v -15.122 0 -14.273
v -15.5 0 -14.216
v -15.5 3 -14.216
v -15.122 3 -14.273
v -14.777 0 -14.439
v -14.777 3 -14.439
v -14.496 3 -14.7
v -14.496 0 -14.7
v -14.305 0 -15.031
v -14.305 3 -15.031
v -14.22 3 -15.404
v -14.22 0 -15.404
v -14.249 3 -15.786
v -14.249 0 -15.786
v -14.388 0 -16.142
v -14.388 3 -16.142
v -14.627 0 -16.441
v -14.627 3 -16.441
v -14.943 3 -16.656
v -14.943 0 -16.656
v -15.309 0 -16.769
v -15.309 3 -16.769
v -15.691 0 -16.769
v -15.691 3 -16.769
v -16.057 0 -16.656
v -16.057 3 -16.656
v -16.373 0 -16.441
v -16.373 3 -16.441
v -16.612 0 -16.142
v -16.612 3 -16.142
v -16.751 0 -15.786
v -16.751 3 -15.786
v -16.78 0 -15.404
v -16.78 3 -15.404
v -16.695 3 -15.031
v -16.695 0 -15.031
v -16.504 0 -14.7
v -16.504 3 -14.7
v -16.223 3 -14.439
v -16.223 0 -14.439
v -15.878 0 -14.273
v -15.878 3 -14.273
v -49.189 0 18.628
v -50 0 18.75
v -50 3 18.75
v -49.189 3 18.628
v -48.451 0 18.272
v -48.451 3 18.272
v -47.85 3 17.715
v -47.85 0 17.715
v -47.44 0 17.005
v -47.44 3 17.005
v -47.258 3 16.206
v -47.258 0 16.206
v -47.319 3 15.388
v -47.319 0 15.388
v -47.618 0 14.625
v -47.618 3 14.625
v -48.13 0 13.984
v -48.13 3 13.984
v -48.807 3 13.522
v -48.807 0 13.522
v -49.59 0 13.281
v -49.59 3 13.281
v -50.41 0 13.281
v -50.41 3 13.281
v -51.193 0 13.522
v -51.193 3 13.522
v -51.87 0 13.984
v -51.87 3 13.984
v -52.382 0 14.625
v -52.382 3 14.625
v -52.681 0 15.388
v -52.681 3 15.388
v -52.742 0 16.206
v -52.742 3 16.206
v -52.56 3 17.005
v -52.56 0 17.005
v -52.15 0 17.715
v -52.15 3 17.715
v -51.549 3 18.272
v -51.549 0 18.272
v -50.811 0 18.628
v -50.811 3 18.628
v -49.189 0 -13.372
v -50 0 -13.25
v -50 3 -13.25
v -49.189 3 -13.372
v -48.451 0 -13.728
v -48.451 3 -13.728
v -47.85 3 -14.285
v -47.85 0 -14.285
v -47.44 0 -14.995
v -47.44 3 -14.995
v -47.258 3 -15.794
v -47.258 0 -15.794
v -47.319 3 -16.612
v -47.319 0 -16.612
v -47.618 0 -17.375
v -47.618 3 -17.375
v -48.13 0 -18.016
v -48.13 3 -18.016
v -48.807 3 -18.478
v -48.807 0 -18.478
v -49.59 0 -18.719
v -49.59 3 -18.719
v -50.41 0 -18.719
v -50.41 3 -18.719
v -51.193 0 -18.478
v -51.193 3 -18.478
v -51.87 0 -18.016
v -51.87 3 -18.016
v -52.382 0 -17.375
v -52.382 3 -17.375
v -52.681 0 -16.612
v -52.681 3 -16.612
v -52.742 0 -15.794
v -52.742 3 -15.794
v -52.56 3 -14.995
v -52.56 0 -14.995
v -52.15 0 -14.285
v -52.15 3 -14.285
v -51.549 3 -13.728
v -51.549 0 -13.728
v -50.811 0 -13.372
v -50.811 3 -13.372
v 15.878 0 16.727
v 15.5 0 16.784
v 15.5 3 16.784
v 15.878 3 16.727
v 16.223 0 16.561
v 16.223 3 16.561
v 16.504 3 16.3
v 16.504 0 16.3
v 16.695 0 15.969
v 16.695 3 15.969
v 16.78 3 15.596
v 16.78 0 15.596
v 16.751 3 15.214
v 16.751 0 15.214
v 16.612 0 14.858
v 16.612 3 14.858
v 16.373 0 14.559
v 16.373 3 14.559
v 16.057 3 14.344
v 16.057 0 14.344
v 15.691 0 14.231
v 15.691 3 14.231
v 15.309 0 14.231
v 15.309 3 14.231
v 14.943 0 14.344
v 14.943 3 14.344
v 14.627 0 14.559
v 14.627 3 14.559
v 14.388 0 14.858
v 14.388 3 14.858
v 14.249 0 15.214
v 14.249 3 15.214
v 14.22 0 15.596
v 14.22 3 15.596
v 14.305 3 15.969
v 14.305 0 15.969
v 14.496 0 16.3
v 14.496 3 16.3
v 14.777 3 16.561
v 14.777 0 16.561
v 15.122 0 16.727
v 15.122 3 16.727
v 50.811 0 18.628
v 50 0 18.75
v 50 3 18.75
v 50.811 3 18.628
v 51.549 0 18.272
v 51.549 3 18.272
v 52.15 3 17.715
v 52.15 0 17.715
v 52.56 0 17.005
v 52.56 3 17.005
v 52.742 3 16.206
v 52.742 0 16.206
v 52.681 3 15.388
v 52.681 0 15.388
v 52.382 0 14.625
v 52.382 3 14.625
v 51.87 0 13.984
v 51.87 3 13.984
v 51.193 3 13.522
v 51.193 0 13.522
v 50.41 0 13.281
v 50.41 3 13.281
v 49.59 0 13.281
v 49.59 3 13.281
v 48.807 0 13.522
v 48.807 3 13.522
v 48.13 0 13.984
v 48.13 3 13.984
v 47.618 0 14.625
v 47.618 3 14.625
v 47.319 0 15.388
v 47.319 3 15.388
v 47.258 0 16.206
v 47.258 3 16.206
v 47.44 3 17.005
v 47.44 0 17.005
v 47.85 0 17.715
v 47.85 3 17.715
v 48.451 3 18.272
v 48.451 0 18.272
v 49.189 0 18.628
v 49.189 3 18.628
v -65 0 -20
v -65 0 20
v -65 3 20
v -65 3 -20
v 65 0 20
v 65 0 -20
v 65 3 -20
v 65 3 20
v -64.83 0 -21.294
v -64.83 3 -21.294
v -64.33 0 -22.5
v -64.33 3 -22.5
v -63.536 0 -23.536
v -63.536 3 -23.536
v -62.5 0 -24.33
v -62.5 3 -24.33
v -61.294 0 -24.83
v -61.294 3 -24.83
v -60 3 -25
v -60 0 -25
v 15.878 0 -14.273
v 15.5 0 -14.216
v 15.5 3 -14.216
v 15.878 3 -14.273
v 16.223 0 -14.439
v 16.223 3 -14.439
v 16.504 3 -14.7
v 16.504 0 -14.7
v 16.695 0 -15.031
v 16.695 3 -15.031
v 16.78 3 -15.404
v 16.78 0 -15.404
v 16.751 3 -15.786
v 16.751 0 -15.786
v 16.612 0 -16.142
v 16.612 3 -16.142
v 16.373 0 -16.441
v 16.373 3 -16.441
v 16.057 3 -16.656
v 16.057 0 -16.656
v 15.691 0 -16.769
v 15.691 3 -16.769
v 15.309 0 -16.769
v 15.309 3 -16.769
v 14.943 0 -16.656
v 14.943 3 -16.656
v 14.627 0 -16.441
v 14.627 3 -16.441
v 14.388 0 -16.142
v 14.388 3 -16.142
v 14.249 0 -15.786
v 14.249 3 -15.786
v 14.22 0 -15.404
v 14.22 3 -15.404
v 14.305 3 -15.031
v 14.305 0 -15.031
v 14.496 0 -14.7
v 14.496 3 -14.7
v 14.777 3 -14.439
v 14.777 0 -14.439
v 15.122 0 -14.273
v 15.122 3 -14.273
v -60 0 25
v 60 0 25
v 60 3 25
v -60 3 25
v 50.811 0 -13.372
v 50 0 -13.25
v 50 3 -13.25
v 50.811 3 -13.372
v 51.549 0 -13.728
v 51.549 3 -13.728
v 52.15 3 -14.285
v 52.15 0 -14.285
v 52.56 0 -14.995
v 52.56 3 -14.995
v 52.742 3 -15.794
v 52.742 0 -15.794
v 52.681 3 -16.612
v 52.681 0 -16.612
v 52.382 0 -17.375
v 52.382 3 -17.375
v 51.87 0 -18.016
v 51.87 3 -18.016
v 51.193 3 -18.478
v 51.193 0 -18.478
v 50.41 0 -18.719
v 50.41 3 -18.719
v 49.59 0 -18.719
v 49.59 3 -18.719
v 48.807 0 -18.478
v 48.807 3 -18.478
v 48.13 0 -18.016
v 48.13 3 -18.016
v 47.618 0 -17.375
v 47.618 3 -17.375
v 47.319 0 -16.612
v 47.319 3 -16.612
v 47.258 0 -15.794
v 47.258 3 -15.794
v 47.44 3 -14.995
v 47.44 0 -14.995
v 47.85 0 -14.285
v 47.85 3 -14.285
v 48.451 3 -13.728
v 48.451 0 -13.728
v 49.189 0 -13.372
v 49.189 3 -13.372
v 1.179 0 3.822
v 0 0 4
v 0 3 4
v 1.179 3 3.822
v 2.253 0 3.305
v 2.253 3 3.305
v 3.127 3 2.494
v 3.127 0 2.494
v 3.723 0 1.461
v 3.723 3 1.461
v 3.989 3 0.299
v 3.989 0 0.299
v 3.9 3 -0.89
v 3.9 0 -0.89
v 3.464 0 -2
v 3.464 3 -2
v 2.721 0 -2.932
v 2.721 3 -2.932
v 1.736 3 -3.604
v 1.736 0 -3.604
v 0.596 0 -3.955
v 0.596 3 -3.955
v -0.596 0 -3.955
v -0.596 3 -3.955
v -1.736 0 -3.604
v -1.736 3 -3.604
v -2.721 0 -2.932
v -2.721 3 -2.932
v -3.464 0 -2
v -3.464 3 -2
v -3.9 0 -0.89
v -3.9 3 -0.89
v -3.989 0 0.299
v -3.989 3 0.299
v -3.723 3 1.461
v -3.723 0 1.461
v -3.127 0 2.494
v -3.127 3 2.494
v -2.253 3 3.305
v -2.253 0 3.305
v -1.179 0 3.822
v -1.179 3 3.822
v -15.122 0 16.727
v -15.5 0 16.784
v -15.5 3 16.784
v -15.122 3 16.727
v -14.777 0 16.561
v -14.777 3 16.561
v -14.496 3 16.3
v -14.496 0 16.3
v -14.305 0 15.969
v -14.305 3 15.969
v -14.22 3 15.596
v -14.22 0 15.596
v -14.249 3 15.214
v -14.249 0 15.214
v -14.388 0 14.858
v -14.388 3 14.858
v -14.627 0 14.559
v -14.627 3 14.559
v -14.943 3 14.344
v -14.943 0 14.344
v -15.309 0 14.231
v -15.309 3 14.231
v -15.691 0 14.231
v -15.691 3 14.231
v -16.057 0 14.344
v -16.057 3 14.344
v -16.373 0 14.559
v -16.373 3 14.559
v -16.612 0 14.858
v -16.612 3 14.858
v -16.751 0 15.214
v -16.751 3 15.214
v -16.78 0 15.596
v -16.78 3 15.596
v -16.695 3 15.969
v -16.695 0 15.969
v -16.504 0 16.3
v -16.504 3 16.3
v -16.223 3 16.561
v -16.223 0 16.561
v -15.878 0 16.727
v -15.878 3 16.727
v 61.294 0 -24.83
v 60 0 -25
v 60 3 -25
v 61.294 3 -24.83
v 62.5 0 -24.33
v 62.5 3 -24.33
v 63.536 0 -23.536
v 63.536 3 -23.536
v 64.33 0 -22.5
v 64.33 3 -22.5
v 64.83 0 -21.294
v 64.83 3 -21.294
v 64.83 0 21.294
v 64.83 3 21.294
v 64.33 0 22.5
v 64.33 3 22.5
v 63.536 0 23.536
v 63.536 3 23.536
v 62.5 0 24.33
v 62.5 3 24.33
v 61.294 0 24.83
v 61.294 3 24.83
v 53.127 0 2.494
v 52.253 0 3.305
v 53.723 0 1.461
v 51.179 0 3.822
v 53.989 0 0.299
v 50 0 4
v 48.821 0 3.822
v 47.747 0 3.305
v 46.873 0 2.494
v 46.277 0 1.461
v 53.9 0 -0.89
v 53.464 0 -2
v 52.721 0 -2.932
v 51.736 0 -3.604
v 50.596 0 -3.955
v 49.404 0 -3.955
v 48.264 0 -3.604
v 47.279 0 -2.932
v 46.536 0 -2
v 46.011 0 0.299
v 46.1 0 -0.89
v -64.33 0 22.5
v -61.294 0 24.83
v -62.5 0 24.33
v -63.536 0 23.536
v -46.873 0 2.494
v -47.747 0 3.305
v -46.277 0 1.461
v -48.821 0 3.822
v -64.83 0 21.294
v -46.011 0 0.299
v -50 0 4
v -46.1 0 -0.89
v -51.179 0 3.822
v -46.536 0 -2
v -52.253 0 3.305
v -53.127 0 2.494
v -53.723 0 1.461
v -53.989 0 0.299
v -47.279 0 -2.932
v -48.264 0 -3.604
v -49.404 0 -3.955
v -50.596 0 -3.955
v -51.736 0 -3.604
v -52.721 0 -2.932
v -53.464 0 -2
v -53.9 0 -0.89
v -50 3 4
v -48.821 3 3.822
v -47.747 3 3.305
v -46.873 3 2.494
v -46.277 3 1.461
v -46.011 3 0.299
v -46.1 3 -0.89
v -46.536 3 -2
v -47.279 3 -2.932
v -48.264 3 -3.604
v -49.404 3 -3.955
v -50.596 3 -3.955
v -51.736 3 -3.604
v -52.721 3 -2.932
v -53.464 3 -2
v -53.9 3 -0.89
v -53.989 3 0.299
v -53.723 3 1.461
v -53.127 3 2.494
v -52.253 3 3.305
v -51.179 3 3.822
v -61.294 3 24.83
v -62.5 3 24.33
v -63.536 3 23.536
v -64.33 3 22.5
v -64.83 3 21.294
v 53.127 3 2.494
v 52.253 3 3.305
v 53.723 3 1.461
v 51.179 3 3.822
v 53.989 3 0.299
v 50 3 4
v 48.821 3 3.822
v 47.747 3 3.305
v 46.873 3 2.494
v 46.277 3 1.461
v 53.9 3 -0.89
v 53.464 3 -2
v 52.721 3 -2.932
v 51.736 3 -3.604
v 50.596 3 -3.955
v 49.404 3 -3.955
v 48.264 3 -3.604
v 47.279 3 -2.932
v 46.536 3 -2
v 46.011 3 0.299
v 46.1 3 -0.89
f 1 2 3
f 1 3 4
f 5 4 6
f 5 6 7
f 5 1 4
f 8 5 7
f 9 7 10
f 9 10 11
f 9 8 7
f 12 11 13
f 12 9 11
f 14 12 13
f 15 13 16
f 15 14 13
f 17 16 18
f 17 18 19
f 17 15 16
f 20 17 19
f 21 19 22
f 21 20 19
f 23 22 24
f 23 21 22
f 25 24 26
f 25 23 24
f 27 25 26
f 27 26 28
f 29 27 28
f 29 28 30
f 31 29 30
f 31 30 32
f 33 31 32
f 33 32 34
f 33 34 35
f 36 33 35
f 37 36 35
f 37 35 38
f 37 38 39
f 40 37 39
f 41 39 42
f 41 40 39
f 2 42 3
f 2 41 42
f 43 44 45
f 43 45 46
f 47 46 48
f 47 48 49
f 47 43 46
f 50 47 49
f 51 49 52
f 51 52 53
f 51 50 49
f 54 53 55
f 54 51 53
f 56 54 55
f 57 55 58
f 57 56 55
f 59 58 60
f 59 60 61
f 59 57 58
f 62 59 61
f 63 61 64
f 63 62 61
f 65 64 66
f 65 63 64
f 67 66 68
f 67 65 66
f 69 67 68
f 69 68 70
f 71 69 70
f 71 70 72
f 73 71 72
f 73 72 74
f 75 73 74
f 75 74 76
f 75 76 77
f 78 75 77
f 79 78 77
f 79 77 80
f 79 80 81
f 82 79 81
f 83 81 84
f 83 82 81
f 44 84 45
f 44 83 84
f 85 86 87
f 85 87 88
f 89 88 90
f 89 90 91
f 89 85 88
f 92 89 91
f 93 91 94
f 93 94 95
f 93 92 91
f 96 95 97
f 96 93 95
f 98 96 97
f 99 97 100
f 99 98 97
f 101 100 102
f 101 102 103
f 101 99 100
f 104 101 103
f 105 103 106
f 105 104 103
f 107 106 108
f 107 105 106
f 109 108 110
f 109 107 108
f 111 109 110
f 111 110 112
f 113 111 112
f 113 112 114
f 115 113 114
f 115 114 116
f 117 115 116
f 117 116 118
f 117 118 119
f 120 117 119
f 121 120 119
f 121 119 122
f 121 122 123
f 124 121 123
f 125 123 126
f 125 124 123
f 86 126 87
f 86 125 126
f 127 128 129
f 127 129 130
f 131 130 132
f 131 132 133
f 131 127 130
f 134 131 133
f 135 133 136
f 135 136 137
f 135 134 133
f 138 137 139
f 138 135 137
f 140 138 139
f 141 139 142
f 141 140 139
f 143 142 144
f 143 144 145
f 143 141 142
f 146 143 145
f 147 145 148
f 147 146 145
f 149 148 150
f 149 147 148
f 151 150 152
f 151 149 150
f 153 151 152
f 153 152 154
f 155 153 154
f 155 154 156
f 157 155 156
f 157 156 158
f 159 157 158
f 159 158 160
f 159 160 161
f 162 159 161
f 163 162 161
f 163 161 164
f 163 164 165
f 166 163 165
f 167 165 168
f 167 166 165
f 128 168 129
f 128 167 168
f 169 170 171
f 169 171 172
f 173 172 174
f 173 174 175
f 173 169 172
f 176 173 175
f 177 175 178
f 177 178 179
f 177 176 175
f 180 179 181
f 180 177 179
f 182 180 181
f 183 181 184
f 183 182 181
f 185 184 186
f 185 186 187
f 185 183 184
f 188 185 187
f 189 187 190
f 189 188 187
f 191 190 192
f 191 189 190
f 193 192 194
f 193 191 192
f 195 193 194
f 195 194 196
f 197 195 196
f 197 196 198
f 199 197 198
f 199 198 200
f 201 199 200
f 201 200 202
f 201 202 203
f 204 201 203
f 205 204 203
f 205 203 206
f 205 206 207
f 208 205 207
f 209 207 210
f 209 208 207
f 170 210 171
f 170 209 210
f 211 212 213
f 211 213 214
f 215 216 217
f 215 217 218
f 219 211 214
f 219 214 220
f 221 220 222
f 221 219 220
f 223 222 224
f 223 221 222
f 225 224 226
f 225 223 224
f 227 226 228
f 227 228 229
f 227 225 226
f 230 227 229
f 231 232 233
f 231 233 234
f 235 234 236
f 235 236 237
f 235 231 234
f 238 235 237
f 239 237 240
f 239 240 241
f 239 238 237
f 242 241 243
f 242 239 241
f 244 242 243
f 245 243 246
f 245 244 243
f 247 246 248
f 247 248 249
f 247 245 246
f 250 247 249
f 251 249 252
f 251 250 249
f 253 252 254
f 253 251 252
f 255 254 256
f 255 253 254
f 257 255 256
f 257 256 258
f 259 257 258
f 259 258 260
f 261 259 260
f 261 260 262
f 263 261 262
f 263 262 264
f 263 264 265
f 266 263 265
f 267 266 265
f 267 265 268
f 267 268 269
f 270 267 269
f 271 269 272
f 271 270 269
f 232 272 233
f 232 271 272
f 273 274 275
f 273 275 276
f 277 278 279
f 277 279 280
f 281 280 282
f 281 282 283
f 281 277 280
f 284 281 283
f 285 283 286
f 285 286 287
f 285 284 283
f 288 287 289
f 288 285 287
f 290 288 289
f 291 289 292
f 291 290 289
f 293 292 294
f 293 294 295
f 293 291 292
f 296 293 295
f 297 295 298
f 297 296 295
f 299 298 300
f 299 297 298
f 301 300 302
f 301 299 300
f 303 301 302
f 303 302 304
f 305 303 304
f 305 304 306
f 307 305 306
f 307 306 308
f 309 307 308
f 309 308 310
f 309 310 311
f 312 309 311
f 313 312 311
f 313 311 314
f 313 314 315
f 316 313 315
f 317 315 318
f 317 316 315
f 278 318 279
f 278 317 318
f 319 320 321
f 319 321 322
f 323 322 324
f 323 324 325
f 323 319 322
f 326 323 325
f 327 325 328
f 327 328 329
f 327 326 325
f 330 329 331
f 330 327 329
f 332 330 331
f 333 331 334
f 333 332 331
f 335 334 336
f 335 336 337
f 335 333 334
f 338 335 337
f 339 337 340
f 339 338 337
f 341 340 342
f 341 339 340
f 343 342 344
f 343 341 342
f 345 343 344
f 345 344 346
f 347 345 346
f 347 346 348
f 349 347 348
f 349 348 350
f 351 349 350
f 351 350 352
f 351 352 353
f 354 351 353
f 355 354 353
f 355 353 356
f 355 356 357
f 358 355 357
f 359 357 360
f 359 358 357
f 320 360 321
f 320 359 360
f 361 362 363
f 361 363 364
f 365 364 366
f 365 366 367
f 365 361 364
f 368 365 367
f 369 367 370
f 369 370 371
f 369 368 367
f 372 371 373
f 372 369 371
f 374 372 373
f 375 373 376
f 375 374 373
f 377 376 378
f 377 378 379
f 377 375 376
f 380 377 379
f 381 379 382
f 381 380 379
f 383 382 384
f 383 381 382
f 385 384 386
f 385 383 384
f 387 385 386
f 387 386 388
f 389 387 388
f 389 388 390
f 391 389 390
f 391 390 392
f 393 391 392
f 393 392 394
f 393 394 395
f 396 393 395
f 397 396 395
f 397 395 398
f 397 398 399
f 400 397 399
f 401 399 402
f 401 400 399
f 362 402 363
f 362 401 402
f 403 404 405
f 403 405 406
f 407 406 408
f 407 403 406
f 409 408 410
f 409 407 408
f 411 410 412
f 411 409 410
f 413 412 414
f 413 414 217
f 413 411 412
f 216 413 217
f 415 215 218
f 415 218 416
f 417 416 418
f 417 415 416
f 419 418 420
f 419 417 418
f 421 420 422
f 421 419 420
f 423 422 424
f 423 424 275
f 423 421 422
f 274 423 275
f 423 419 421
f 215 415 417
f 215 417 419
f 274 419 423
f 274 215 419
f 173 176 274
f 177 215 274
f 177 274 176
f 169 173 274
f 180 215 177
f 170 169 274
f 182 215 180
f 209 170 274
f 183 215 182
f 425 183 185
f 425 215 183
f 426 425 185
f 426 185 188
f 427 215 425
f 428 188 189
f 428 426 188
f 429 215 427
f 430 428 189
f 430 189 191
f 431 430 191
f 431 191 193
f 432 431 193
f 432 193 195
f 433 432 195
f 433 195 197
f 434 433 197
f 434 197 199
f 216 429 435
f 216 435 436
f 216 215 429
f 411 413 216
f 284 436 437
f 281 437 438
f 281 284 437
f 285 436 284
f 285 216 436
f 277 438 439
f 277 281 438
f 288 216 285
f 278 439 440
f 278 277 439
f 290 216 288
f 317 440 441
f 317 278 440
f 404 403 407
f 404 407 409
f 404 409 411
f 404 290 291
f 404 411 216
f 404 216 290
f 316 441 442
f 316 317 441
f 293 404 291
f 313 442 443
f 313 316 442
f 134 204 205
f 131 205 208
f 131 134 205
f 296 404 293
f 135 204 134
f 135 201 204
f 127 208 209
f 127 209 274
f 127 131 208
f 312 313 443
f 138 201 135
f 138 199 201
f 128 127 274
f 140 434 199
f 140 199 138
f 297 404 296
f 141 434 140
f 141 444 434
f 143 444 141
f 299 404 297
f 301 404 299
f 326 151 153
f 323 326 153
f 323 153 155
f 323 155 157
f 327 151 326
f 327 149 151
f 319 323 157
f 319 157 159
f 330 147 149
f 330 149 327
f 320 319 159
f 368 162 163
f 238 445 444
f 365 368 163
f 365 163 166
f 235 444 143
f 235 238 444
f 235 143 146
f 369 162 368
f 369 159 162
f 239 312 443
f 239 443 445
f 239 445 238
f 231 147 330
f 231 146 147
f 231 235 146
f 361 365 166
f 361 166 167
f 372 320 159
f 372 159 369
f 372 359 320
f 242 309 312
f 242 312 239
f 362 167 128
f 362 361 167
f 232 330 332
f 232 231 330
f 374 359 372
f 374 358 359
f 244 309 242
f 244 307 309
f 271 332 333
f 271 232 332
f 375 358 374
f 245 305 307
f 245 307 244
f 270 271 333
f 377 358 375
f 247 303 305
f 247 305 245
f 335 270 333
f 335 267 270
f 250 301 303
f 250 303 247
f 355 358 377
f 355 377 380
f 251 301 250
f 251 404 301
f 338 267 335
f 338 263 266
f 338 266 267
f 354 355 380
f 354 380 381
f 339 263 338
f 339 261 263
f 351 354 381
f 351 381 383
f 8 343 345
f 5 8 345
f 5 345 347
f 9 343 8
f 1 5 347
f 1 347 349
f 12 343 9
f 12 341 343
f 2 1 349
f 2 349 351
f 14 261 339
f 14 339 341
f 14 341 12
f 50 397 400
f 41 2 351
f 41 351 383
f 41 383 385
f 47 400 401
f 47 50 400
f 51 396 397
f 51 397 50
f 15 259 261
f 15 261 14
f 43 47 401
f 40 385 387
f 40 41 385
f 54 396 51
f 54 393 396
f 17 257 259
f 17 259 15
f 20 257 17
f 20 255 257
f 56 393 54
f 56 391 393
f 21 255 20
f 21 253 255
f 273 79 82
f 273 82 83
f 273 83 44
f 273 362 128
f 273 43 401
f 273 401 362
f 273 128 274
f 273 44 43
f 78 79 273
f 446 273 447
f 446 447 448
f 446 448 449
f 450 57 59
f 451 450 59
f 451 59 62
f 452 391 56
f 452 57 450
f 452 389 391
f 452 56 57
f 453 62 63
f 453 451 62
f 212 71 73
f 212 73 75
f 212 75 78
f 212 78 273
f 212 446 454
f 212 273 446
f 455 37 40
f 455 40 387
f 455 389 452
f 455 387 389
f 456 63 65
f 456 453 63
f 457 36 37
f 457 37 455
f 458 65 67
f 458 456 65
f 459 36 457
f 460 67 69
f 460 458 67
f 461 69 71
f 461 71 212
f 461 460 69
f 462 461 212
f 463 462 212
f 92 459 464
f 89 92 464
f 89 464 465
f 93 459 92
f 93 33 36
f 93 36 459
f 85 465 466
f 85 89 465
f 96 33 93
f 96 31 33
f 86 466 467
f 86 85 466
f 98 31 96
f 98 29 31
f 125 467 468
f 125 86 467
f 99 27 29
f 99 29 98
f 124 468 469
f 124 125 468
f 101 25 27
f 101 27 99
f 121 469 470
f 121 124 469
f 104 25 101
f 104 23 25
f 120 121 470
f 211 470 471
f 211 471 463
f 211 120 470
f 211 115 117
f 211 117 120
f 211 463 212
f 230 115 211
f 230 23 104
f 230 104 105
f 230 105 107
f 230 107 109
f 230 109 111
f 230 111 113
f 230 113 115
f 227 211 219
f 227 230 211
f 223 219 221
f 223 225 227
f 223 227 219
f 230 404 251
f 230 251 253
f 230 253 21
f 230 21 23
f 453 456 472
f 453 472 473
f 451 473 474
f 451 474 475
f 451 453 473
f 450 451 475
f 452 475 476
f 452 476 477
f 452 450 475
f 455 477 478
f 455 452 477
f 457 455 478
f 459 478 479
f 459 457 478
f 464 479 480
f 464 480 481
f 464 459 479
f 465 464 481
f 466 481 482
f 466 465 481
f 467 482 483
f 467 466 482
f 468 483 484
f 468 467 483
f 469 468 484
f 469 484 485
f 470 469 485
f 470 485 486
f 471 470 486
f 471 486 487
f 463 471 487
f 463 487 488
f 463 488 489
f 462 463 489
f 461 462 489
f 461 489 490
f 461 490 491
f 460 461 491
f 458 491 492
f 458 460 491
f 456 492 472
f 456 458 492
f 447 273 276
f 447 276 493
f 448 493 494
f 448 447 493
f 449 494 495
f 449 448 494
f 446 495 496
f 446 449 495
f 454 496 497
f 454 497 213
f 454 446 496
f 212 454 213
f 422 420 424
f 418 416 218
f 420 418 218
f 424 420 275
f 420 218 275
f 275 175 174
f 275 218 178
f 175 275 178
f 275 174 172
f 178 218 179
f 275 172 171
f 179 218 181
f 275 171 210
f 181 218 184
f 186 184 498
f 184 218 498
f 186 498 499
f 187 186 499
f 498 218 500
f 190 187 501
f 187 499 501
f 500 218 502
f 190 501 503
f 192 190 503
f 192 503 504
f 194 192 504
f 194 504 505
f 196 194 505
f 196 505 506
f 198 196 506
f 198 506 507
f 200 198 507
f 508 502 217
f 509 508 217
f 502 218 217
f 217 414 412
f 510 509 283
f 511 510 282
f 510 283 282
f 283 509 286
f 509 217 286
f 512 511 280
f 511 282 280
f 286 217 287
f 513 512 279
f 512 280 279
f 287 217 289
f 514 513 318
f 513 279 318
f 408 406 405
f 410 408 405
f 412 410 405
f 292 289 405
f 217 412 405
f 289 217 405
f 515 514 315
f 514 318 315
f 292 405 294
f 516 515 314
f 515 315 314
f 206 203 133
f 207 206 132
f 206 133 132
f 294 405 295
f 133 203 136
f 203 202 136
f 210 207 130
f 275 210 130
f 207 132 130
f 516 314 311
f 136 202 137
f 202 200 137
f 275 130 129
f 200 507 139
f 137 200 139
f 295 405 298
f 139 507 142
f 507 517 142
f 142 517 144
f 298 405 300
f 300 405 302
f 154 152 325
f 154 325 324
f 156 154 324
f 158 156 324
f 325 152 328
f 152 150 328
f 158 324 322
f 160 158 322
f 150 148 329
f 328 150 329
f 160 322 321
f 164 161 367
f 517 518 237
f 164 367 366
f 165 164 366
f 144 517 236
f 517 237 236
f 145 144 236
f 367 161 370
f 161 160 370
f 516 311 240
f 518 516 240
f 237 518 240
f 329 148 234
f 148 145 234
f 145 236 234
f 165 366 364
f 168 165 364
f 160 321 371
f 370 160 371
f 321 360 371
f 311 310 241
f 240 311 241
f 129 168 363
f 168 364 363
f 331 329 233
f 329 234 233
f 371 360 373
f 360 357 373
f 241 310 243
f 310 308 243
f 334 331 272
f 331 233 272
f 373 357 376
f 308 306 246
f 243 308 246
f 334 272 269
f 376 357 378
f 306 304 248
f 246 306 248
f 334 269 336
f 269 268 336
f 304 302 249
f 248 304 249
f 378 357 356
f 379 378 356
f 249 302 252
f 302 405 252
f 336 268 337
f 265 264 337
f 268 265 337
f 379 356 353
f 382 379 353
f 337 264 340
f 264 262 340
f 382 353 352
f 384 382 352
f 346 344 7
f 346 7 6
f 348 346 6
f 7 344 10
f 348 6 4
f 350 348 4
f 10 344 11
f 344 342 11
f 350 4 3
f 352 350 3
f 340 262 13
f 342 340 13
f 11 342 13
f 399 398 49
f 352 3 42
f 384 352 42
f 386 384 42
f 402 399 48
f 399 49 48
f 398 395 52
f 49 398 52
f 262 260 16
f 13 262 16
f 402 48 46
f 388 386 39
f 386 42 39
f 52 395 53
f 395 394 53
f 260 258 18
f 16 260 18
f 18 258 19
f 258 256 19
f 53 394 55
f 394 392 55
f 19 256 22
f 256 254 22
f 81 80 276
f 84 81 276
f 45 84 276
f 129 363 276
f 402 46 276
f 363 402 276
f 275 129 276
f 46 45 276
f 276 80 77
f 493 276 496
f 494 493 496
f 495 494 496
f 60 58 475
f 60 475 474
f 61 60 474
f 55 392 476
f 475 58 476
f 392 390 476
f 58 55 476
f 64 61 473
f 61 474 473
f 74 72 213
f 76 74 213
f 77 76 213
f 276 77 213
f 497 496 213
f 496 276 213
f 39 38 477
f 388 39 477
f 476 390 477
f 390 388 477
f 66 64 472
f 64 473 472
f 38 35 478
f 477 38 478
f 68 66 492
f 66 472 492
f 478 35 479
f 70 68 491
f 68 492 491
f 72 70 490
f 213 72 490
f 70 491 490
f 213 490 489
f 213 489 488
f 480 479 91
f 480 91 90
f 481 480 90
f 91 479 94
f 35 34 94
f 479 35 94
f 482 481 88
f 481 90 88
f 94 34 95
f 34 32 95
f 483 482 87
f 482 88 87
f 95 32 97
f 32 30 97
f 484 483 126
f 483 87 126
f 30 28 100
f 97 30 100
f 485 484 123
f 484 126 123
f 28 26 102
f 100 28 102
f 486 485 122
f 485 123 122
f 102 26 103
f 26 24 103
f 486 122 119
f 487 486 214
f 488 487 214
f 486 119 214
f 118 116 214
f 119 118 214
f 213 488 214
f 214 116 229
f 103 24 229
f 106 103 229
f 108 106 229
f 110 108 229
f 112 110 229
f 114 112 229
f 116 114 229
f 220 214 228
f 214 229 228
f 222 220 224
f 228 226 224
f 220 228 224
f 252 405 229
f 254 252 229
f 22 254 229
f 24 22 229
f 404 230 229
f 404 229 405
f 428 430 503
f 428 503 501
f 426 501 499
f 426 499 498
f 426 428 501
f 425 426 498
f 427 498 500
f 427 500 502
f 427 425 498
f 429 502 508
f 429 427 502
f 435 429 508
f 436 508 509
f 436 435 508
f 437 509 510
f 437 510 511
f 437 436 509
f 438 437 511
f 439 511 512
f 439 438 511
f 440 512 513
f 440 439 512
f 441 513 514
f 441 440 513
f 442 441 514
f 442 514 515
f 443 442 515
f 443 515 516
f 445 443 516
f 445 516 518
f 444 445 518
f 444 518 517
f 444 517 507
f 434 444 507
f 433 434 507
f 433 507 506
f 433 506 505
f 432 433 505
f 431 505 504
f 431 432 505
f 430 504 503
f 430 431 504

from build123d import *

# Parameters (mm, degrees)
SKETCH_1_R      = 2.75
SKETCH_1_R_2    = 4
SKETCH_1_R_3    = 1.283558174
EXTRUDE_1_DEPTH = 3


with BuildPart() as part:
    # 草图1 → 凸台-拉伸1 (new body)
    with BuildSketch(Plane(origin=(0, 0, 0), x_dir=(1, 0, 0), z_dir=(0, 1, 0))):
        with BuildLine():
            ThreePointArc((-65, 20), (-63.535533906, 23.535533906), (-60, 25))
            Line((-60, 25), (0, 25))
            Line((0, 25), (60, 25))
            ThreePointArc((60, 25), (63.535533906, 23.535533906), (65, 20))
            Line((65, 20), (65, -20))
            ThreePointArc((65, -20), (63.535533906, -23.535533906), (60, -25))
            Line((60, -25), (-60, -25))
            ThreePointArc((-60, -25), (-63.535533906, -23.535533906), (-65, -20))
            Line((-65, -20), (-65, 20))
        make_face()
        with Locations(Location((-50, 16, 0), (0, 0, 270))):
            Circle(SKETCH_1_R, mode=Mode.SUBTRACT)
        with Locations(Location((0, 0, 0), (0, 0, 270))):
            Circle(SKETCH_1_R_2, mode=Mode.SUBTRACT)
        with Locations(Location((15.5, 15.5, 0), (0, 0, 270))):
            Circle(SKETCH_1_R_3, mode=Mode.SUBTRACT)
        with Locations(Location((15.5, -15.5, 0), (0, 0, 270))):
            Circle(SKETCH_1_R_3, mode=Mode.SUBTRACT)
        with Locations(Location((-15.5, -15.5, 0), (0, 0, 270))):
            Circle(SKETCH_1_R_3, mode=Mode.SUBTRACT)
        with Locations(Location((-15.5, 15.5, 0), (0, 0, 270))):
            Circle(SKETCH_1_R_3, mode=Mode.SUBTRACT)
        with Locations(Location((50, 0, 0), (0, 0, 270))):
            Circle(SKETCH_1_R_2, mode=Mode.SUBTRACT)
        with Locations(Location((50, 16, 0), (0, 0, 270))):
            Circle(SKETCH_1_R, mode=Mode.SUBTRACT)
        with Locations(Location((50, -16, 0), (0, 0, 270))):
            Circle(SKETCH_1_R, mode=Mode.SUBTRACT)
        with Locations(Location((-50, -16, 0), (0, 0, 270))):
            Circle(SKETCH_1_R, mode=Mode.SUBTRACT)
        with Locations(Location((-50, 0, 0), (0, 0, 270))):
            Circle(SKETCH_1_R_2, mode=Mode.SUBTRACT)
    extrude(amount=EXTRUDE_1_DEPTH)


solid = part.part
